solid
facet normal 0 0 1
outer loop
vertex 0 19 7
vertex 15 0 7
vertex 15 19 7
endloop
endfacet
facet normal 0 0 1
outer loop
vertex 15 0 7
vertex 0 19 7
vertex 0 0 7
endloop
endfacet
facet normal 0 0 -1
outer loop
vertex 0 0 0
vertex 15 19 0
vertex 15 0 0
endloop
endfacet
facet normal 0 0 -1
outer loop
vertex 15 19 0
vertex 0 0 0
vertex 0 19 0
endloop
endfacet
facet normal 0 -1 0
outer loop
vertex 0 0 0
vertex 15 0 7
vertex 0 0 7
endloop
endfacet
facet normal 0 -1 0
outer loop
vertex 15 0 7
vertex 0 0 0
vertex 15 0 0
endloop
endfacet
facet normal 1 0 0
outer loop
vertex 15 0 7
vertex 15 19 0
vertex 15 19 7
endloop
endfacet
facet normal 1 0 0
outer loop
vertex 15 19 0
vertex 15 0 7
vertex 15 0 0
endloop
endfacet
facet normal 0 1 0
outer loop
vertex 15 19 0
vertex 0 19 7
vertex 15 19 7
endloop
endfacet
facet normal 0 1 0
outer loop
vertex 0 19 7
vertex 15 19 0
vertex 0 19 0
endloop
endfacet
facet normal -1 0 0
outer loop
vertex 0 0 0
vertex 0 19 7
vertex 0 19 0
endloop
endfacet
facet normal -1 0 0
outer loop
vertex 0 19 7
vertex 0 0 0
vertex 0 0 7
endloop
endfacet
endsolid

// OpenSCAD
// Generated by SolidPython 1.0.1 on 2020-07-29 00:46:56


cube(size = [15, 19, 7]);
/***********************************************
*********      SolidPython code:      **********
************************************************
 
# import packages: SolidPython
from solid import *
from solid.utils import *
from itertools import chain, combinations, permutations


class Resize:

    def __init__(self, scad_file):
        self.scad_file = scad_file
        #self.scad_file = import_scad(scad_file)
        # cone/cylinder param:
        self.r1 = 0
        self.r2 = 0
        self.h = 0
        # rectangular prism param:
        self.w = 0
        self.l = 0
        # ellipse param:
        self.r = 0

    # import OpenScad code (file name corresponds to shape)


    # classify shape + parameters
    def assign(self, param1, param2, param3):
        if self.scad_file == 'cone.scad':
            self.r1 = param1
            self.r2 = param2
            self.h = param3
        elif self.scad_file == 'cylinder.scad':
            self.r1 = param1
            self.r2 = param2
            self.h = param3
        elif self.scad_file == 'rectangularPrism.scad':
            self.h = param1
            self.l = param2
            self.w = param3
        else:
            self.r = param1
            self.h = param2

    # resize parameters
    def iterate(self):
        x = range(3, 20, 2)
        i = 1
        if self.scad_file == 'cone.scad':
            tempList = list(permutations(x, 2))
            for temp in tempList:
                param1 = temp[0]
                param2 = temp[1]
                filepath = 'produced_scad_files/' + 'cone' + str(param1) + '_' + str(param2) + '_' + '.scad'
                scad_render_to_file(cylinder(h=param1, r1=param2, r2=0), filepath)

        elif self.scad_file == 'cylinder.scad':
            tempList = list(permutations(x, 3))
            for temp in tempList:
                param1 = temp[0]
                param2 = temp[1]
                filepath = 'produced_scad_files/' + 'cylinder' + str(param1) + '_' + str(param2) + '_' + '.scad'
                scad_render_to_file(cylinder(h=param1, r1=param2, r2=param2), filepath)

        elif self.scad_file == 'rectangularPrism.scad':
            tempList = list(permutations(x, 3))
            for temp in tempList:
                param1 = temp[0]
                param2 = temp[1]
                param3 = temp[2]
                filepath = 'produced_scad_files/' + 'rectangularPrism' + str(param1) + '_' + str(param2) + '_' + str(
                    param3) + '.scad'
                scad_render_to_file(cube(size=(param1, param2, param3)), filepath)

        elif self.scad_file == 'ellipse.scad':
            tempList = list(permutations(x, 4))
            for temp in tempList:
                param1 = temp[0]
                param2 = temp[1]
                param3 = temp[2]
                param4 = temp[3]
                filepath = 'produced_scad_files/' + 'ellipse' + str(param1) + '_' + str(param2) + '_' + str(param3) + '_' + str(param4) + '.scad'
                scad_render_to_file(scale([param1, param2, param3])(sphere(r=param4)), filepath)

    def render_to_scadfile(self):
        scad_render_to_file(scad, 'example.scad') 
 
************************************************/
